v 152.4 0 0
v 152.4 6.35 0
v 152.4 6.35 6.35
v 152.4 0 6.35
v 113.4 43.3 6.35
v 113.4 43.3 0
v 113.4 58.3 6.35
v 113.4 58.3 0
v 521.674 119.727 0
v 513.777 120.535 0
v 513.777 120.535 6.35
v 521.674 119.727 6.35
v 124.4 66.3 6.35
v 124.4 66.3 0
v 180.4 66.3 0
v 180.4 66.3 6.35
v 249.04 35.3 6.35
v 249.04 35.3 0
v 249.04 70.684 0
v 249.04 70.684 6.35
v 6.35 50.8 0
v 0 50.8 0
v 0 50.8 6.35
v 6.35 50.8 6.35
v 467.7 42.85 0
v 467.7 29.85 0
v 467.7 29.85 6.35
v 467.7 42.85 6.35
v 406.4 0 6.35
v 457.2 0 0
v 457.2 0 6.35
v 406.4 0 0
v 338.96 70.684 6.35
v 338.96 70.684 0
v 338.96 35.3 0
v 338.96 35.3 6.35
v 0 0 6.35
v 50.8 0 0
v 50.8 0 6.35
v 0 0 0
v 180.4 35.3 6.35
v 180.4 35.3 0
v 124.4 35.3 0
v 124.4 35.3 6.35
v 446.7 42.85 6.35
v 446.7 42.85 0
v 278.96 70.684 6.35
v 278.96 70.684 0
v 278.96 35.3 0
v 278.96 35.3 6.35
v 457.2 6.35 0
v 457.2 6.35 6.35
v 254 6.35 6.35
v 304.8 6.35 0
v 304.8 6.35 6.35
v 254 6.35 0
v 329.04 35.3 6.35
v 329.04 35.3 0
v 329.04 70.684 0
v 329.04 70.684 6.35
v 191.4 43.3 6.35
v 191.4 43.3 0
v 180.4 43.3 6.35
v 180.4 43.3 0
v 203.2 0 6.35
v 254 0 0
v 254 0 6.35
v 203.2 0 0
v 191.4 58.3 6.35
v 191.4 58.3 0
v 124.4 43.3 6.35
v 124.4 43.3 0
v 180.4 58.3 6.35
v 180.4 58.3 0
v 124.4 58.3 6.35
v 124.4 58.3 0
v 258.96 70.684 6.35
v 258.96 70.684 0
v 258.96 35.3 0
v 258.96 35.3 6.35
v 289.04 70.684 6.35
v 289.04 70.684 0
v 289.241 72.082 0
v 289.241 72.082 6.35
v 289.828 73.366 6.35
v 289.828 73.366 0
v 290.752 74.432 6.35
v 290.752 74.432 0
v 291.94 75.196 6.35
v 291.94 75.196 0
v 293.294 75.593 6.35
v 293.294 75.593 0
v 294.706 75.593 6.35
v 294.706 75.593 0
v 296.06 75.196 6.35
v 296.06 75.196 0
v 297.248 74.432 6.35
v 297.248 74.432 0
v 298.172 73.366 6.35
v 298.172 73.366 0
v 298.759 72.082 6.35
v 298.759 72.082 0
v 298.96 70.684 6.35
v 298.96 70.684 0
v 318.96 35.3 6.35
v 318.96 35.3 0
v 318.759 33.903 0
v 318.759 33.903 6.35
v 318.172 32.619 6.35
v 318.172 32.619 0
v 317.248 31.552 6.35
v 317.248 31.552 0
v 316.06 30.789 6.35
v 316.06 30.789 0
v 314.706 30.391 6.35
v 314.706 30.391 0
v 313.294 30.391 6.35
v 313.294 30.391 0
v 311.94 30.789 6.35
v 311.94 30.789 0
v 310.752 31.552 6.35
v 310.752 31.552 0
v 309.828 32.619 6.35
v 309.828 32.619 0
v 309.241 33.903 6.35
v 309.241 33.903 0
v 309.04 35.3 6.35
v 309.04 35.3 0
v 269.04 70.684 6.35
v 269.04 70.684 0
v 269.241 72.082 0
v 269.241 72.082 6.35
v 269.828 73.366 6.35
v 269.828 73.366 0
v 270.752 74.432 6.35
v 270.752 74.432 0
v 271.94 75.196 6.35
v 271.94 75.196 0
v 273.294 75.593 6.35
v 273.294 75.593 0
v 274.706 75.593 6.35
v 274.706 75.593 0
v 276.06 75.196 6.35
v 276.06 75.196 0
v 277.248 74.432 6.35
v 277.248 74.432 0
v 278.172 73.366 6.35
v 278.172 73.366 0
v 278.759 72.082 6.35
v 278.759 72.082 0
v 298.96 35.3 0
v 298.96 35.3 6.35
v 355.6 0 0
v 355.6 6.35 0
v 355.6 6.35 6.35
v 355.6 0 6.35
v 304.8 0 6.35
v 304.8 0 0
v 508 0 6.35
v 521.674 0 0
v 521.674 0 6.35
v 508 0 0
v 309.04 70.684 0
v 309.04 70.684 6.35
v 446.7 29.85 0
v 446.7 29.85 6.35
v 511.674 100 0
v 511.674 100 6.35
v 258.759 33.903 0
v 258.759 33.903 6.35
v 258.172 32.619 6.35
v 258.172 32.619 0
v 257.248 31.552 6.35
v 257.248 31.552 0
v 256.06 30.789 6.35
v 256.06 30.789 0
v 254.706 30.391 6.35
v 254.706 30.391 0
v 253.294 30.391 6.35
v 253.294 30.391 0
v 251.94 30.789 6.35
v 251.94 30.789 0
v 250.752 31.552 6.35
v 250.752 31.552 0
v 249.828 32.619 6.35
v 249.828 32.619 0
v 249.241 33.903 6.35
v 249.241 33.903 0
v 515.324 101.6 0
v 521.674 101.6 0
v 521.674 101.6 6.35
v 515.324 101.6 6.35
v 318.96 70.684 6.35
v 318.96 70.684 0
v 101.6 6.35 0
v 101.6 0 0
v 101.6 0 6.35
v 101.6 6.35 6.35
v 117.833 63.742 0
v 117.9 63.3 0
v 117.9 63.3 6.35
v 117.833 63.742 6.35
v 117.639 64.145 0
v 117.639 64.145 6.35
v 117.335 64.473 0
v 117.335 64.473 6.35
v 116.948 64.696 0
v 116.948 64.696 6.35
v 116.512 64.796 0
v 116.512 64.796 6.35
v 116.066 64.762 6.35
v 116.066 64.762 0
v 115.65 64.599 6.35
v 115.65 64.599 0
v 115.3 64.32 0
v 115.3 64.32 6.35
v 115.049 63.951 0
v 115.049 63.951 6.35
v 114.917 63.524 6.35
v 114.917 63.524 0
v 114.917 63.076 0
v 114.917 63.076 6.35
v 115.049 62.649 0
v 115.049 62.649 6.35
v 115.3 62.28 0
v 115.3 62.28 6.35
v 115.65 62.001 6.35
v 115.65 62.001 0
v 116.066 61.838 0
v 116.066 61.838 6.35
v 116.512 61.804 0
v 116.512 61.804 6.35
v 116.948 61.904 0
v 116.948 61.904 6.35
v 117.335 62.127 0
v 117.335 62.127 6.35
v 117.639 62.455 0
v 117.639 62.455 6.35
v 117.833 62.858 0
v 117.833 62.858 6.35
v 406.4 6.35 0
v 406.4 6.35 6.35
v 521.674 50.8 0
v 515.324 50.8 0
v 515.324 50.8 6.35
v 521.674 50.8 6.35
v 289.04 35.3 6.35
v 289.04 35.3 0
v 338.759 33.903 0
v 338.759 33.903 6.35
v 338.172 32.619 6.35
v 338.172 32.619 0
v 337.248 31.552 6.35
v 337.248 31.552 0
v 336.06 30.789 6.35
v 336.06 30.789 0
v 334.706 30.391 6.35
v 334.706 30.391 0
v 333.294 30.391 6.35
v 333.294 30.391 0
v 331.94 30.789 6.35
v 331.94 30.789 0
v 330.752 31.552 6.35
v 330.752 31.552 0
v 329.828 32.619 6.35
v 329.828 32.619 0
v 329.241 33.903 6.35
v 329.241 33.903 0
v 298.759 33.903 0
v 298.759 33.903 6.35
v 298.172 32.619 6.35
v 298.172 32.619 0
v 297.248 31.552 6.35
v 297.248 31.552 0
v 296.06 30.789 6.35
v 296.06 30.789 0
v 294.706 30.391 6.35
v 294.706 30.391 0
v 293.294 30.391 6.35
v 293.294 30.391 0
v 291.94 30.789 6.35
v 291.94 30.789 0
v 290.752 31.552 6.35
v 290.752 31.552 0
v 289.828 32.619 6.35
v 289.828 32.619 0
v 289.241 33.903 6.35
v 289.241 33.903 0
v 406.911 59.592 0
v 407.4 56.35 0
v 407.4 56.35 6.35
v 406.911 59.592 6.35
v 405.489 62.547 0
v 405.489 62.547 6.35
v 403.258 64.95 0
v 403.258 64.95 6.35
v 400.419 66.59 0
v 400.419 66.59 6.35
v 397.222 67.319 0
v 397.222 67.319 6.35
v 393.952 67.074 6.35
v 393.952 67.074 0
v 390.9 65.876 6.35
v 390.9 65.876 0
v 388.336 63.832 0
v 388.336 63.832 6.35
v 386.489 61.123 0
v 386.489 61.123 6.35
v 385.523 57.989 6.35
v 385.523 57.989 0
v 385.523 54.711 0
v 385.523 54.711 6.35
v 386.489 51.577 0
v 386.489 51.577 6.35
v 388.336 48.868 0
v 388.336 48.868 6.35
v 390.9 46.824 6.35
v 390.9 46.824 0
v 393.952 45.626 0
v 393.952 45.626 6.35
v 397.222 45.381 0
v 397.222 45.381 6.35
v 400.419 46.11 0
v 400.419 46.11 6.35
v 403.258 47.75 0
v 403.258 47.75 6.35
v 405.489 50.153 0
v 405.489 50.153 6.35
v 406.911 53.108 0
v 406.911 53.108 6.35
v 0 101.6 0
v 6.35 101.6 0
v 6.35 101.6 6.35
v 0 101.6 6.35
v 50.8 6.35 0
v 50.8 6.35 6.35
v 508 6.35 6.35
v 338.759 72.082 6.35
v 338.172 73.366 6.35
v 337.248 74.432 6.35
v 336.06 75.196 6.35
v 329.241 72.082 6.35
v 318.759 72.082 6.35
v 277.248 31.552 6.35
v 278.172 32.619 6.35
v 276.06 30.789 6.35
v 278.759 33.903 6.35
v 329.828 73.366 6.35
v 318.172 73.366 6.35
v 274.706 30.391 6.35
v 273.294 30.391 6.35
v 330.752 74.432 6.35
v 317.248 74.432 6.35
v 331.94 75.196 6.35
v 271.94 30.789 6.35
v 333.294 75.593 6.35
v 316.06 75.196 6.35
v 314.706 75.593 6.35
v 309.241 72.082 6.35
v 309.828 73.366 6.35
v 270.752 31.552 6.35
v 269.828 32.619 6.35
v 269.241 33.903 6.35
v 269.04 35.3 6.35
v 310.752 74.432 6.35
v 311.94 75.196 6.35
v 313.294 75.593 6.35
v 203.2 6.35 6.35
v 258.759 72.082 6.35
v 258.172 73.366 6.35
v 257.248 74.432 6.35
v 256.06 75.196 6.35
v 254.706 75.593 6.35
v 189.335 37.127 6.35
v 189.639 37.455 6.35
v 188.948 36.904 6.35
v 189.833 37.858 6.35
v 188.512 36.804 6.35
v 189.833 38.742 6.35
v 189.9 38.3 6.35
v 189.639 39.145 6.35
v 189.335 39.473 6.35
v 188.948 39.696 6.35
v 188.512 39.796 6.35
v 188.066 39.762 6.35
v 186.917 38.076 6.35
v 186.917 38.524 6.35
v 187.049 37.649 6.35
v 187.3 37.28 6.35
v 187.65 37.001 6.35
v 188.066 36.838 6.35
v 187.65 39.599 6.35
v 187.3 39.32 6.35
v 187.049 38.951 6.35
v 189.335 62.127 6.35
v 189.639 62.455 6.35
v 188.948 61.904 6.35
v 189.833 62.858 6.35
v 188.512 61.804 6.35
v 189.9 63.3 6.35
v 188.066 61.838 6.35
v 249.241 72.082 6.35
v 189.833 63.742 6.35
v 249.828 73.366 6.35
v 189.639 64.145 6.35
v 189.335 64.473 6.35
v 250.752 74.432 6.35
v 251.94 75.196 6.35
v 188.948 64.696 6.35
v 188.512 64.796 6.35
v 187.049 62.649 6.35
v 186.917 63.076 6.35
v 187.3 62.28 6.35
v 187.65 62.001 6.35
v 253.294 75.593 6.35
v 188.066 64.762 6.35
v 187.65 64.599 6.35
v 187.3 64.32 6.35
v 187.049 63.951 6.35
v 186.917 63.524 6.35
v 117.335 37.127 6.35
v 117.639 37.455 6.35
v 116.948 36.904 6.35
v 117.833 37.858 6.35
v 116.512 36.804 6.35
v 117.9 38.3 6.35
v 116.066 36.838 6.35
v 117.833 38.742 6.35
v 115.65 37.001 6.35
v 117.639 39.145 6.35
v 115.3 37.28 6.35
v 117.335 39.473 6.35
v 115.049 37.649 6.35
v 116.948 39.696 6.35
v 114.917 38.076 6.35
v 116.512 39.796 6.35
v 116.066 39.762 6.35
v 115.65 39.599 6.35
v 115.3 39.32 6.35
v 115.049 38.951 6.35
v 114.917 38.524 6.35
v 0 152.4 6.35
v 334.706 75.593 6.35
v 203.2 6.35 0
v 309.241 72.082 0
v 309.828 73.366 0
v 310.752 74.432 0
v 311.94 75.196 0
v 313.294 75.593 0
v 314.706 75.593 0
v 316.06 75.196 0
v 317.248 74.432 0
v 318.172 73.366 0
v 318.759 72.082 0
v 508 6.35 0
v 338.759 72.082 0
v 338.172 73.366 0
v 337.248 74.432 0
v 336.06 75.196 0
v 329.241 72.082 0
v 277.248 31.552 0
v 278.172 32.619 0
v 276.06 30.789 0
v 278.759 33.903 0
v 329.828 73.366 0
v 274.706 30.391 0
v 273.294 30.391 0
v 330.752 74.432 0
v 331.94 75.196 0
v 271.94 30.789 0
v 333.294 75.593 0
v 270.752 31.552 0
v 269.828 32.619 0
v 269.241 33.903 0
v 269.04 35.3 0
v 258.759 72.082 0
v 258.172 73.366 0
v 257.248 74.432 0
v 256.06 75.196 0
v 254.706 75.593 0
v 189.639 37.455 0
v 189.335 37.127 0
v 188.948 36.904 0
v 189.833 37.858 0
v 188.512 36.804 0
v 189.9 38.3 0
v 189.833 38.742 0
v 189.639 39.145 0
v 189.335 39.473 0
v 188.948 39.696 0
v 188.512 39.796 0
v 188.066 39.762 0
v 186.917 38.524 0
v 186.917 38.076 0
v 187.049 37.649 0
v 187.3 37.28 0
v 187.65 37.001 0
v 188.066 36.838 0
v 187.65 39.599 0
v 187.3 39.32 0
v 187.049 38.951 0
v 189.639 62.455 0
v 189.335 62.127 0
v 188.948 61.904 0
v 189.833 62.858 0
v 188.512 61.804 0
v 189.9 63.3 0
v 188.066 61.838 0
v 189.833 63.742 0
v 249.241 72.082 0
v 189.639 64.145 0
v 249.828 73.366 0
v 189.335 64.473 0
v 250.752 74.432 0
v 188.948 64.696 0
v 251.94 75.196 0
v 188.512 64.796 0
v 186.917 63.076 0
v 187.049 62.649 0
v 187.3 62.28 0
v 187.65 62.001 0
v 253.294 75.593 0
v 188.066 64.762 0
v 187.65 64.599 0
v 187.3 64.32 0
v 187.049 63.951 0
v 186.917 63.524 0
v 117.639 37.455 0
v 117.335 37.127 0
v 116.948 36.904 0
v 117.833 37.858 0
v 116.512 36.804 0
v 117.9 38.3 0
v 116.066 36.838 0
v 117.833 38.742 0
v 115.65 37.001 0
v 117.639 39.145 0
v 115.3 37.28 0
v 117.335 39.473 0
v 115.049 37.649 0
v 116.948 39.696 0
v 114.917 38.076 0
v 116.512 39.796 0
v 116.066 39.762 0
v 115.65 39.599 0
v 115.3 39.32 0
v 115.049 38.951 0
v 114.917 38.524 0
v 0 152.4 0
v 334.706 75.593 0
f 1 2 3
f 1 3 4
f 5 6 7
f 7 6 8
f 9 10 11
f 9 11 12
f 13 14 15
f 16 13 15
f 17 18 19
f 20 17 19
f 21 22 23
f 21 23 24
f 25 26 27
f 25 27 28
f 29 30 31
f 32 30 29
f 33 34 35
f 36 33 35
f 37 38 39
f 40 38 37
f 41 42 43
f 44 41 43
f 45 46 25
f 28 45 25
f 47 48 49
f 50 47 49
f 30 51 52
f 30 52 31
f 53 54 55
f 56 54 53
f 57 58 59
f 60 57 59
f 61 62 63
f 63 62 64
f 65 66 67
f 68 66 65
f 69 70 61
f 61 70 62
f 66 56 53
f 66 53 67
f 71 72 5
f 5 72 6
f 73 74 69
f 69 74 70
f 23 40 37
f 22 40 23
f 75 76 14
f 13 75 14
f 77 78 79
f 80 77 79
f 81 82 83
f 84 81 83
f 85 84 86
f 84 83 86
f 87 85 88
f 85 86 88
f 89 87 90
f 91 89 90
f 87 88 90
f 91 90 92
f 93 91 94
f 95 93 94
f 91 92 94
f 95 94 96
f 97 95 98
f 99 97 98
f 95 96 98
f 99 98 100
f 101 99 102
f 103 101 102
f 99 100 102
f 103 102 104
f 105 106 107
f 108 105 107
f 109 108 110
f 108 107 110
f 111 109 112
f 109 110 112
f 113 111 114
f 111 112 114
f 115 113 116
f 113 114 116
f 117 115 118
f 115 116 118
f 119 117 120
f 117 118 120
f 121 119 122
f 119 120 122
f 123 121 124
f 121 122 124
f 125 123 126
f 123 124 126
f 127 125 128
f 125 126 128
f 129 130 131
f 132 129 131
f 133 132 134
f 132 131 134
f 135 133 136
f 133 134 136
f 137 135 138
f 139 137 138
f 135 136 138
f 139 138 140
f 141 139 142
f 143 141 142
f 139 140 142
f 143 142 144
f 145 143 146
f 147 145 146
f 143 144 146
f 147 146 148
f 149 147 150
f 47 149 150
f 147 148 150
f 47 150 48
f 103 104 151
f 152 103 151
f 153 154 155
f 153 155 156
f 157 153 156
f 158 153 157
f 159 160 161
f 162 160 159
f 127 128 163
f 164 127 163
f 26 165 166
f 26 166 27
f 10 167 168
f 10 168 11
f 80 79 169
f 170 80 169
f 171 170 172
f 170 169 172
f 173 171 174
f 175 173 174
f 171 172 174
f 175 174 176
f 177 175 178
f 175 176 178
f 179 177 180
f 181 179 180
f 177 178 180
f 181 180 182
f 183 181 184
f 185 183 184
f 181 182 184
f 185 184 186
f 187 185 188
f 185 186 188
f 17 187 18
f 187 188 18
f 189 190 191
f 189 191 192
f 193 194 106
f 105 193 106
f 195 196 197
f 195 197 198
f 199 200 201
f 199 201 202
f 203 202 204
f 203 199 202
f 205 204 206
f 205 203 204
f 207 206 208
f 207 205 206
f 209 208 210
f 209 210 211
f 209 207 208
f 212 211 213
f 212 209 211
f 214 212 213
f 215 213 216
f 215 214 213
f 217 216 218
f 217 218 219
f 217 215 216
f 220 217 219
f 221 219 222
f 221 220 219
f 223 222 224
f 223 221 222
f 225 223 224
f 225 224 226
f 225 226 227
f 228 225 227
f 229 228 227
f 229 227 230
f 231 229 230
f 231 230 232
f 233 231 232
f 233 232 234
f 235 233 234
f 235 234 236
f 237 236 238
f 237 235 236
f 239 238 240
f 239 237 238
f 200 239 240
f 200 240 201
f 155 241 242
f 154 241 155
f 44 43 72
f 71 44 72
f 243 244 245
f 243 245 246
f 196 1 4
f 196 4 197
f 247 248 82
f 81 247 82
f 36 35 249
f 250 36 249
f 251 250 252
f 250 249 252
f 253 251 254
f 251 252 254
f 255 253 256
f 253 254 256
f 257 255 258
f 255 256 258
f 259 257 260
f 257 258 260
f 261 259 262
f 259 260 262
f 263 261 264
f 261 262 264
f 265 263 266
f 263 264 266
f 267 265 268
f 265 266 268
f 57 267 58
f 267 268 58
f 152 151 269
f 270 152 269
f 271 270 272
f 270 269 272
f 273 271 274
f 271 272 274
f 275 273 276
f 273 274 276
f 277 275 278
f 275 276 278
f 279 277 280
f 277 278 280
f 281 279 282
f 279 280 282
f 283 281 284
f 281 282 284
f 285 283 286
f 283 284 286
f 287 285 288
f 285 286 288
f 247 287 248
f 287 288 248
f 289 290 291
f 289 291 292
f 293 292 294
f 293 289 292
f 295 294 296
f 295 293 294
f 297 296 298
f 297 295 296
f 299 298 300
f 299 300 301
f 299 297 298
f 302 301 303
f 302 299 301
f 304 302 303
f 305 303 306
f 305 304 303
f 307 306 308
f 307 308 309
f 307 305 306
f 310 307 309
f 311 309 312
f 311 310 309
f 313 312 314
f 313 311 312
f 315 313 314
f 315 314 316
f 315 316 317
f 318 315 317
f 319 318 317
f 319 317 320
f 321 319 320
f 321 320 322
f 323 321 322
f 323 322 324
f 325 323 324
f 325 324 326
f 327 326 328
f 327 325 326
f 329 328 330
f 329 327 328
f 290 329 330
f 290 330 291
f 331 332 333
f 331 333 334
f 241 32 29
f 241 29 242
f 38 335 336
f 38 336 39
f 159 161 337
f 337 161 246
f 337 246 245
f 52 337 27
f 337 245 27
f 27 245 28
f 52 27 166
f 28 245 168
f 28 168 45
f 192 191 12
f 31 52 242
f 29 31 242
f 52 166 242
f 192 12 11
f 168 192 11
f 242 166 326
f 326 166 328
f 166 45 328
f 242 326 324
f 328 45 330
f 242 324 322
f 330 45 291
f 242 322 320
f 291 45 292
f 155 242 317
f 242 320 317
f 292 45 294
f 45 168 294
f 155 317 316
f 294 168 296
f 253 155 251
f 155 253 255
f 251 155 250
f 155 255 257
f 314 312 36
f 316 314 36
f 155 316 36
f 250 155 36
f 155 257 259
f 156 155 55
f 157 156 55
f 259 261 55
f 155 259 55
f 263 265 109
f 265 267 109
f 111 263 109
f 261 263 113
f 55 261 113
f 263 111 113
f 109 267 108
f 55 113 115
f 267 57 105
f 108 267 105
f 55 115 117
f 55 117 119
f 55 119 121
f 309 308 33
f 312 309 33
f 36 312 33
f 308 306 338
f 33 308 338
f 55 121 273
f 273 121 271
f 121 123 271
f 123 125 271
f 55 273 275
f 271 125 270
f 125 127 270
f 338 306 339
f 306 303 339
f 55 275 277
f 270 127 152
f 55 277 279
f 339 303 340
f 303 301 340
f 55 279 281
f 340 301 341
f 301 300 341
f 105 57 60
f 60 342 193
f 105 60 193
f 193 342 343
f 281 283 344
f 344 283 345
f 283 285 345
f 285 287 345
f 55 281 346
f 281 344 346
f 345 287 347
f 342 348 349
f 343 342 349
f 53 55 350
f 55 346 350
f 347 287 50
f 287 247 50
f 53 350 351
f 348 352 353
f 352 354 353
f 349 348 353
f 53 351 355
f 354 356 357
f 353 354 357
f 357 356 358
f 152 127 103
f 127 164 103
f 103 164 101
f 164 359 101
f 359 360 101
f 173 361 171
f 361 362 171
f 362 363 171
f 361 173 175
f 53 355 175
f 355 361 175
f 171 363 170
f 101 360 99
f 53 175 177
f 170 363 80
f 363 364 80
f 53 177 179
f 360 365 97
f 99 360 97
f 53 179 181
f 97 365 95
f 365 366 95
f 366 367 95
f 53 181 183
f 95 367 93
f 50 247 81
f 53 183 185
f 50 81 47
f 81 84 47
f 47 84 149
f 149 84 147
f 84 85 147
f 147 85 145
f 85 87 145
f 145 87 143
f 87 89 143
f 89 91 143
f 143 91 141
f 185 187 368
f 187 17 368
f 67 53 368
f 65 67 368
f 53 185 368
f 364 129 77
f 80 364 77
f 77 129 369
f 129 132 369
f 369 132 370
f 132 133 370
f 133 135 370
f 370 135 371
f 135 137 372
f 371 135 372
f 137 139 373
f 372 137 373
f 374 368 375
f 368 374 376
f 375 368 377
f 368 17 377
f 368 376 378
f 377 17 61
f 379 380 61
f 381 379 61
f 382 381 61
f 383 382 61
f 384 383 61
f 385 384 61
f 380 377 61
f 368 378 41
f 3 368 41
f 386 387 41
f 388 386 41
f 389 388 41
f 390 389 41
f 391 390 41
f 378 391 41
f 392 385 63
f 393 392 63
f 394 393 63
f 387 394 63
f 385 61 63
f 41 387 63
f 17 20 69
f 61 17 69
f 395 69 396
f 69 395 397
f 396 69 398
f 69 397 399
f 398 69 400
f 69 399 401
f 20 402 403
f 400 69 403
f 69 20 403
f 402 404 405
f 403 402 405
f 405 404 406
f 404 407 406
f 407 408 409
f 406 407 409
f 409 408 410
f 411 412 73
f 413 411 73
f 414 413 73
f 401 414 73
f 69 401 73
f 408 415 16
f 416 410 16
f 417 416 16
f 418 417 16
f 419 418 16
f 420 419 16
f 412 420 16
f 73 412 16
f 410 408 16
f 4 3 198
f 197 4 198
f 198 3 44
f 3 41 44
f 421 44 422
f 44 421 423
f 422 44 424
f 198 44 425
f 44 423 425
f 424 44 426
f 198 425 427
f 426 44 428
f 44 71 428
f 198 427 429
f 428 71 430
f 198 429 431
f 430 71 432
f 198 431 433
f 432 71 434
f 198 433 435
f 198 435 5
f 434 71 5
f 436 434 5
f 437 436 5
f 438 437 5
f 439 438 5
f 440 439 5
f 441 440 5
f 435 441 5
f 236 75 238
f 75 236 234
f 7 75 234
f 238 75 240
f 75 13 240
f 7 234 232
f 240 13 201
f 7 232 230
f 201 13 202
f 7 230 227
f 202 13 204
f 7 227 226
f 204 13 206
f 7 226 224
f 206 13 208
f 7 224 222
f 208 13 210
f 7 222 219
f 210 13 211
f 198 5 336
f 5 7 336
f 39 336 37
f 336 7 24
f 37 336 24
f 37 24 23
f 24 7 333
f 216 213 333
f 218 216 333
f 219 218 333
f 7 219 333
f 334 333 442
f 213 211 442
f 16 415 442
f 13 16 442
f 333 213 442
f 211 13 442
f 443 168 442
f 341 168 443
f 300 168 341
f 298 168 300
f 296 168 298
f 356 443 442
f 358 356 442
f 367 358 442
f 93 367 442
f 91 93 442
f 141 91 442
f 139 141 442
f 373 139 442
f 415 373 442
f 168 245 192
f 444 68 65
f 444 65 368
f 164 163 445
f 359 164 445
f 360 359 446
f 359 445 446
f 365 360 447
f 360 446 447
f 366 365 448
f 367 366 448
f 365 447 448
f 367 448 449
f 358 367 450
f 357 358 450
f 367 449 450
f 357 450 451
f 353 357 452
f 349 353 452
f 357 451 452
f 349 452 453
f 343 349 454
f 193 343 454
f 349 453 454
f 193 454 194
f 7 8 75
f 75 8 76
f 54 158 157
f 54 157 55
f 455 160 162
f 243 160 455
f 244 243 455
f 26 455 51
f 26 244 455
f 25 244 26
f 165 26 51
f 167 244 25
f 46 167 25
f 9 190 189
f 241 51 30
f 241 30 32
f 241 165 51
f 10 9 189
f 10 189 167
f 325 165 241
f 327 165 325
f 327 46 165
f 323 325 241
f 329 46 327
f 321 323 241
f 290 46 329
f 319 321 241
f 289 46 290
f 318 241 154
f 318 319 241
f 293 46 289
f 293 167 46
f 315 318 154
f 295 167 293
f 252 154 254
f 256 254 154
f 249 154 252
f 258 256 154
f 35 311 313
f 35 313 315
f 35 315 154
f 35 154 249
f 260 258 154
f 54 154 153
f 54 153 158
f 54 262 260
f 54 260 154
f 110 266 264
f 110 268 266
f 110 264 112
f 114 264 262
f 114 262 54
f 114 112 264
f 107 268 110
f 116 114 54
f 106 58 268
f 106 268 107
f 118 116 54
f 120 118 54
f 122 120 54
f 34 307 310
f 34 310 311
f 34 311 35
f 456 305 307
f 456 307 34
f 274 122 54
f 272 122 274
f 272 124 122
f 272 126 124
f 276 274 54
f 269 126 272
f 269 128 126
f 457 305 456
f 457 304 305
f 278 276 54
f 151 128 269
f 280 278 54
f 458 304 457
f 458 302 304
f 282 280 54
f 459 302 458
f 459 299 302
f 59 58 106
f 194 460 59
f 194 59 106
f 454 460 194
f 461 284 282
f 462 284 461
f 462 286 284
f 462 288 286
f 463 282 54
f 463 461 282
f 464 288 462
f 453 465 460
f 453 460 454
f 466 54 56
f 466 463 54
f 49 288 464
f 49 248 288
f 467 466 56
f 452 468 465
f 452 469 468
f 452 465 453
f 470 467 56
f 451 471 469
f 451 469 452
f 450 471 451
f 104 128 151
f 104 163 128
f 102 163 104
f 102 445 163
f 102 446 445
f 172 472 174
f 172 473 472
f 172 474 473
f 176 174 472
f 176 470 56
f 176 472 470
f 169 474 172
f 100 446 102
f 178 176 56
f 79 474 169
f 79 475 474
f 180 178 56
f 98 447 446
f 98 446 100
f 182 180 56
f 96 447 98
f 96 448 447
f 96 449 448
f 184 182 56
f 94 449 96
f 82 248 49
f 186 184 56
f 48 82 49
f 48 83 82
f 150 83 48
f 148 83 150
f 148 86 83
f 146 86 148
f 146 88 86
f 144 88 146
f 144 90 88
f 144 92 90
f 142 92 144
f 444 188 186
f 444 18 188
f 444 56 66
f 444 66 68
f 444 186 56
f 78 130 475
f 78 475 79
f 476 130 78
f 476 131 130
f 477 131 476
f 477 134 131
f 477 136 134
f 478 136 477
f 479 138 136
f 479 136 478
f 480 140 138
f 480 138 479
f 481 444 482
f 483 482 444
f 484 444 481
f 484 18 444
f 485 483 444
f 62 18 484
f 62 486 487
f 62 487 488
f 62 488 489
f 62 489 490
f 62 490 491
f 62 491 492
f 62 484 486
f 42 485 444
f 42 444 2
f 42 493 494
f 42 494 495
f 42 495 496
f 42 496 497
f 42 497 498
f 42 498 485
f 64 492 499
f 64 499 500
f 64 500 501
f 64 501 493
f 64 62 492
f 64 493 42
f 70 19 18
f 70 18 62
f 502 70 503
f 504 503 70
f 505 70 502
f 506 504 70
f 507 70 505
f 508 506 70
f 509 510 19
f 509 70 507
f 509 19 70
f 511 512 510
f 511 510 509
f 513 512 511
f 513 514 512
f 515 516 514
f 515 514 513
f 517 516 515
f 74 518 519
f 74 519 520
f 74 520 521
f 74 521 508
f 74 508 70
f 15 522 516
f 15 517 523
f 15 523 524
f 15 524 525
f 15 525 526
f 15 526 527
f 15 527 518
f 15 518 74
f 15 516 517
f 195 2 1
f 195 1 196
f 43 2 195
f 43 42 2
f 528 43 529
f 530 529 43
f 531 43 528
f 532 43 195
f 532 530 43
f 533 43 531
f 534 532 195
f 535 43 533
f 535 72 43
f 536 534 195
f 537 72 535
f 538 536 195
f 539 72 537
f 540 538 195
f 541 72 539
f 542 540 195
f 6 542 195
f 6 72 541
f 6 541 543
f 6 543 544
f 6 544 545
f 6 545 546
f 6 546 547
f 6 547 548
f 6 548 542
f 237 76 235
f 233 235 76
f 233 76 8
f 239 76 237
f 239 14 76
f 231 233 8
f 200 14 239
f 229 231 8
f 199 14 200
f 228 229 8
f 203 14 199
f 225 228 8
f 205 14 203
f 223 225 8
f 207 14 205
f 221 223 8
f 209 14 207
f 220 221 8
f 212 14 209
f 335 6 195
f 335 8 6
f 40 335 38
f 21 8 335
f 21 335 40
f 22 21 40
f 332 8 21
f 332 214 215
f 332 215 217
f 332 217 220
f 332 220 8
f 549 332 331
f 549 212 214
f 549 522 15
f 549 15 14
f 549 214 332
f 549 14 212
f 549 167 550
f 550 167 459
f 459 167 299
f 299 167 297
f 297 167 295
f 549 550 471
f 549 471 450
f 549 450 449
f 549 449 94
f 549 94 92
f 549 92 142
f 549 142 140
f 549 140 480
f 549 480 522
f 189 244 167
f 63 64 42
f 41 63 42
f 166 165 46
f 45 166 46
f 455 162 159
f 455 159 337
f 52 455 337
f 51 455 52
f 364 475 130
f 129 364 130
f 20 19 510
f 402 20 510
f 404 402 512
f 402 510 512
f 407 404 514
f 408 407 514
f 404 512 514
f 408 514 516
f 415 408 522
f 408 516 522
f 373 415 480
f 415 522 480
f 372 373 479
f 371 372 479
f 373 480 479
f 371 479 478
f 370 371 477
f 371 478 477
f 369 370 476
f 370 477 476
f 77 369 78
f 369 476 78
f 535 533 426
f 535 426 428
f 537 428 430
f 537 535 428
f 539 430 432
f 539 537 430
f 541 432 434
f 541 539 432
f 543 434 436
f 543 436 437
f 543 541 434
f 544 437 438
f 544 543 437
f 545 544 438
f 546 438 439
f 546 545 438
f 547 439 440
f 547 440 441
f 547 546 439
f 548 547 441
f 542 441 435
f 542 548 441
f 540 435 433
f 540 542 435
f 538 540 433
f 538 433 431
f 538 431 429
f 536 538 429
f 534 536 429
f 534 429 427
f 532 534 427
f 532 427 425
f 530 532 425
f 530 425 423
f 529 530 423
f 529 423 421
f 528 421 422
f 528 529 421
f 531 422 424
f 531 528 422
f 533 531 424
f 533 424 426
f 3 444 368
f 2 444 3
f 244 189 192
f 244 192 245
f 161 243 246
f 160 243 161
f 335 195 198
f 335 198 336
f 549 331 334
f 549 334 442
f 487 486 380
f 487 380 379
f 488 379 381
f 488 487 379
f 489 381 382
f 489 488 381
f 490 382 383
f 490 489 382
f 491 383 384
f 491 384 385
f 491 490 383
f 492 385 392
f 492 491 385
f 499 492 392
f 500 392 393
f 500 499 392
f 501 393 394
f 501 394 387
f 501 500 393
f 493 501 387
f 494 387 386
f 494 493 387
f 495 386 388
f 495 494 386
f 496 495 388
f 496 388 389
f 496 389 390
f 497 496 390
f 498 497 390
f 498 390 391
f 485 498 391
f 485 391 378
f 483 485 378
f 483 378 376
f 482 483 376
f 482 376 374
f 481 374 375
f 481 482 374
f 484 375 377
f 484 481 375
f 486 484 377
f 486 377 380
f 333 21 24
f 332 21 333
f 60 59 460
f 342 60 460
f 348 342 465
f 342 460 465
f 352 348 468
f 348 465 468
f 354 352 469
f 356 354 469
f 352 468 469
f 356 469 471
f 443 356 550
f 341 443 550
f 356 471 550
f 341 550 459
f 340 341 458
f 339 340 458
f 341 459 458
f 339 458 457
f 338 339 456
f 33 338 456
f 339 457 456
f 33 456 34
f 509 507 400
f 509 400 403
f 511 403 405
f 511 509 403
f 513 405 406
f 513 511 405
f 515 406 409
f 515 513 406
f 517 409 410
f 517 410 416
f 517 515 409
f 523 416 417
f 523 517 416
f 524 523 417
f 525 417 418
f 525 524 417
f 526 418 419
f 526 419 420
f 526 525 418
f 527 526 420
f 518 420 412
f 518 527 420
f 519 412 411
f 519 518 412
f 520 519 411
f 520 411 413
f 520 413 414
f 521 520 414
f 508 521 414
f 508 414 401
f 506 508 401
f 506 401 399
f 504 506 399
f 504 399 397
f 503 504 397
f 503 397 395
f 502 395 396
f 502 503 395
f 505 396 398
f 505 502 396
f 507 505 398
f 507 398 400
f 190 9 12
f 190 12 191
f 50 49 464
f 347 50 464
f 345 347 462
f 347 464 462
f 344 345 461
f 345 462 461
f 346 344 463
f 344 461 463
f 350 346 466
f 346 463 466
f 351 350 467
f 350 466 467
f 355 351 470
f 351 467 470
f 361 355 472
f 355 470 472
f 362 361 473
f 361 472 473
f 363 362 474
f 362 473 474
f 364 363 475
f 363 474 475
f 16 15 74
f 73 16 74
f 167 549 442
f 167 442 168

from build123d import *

# Parameters (mm, degrees)
SKETCH2_R           = 11
SKETCH2_R_2         = 1.5
SKETCH2_W           = 21
SKETCH2_H           = 13
BOSS_EXTRUDE1_DEPTH = 6.35


with BuildPart() as part:
    # Sketch2 → Boss-Extrude1 (new body)
    with BuildSketch(Plane.XY):
        Polygon((0, 152.4), (511.673882957, 100), (513.77689344, 120.535411062), (521.673882957, 119.726688428), (521.673882957, 101.6), (515.323882957, 101.6), (515.323882957, 50.8), (521.673882957, 50.8), (521.673882957, 0), (508, 0), (508, 6.35), (457.2, 6.35), (457.2, 0), (406.4, 0), (406.4, 6.35), (355.6, 6.35), (355.6, 0), (304.8, 0), (304.8, 6.35), (254, 6.35), (254, 0), (203.2, 0), (203.2, 6.35), (152.4, 6.35), (152.4, 0), (101.6, 0), (101.6, 6.35), (50.8, 6.35), (50.8, 0), (0, 0), (0, 50.8), (6.35, 50.8), (6.35, 101.6), (0, 101.6), align=None)
        with Locations((396.4, 56.35)):
            Circle(SKETCH2_R, mode=Mode.SUBTRACT)
        with Locations((116.4, 63.3)):
            Circle(SKETCH2_R_2, mode=Mode.SUBTRACT)
        with Locations((188.4, 63.3)):
            Circle(SKETCH2_R_2, mode=Mode.SUBTRACT)
        with Locations((188.4, 38.3)):
            Circle(SKETCH2_R_2, mode=Mode.SUBTRACT)
        with Locations((116.4, 38.3)):
            Circle(SKETCH2_R_2, mode=Mode.SUBTRACT)
        Polygon((180.4, 58.3), (191.4, 58.3), (191.4, 43.3), (180.4, 43.3), (180.4, 35.3), (124.4, 35.3), (124.4, 43.3), (113.4, 43.3), (113.4, 58.3), (124.4, 58.3), (124.4, 66.3), (180.4, 66.3), align=None, mode=Mode.SUBTRACT)
        with Locations((457.2, 36.35)):
            Rectangle(SKETCH2_W, SKETCH2_H, mode=Mode.SUBTRACT)
        with BuildLine():
            Line((249.0403247, 35.3), (249.0403247, 70.684208401))
            ThreePointArc((249.0403247, 70.684208401), (254, 75.643883701), (258.9596753, 70.684208401))
            Line((258.9596753, 70.684208401), (258.9596753, 35.3))
            ThreePointArc((258.9596753, 35.3), (254, 30.3403247), (249.0403247, 35.3))
        make_face(mode=Mode.SUBTRACT)
        with BuildLine():
            Line((269.0403247, 35.3), (269.0403247, 70.684208401))
            ThreePointArc((269.0403247, 70.684208401), (274, 75.643883701), (278.9596753, 70.684208401))
            Line((278.9596753, 70.684208401), (278.9596753, 35.3))
            ThreePointArc((278.9596753, 35.3), (274, 30.3403247), (269.0403247, 35.3))
        make_face(mode=Mode.SUBTRACT)
        with BuildLine():
            Line((289.0403247, 35.3), (289.0403247, 70.684208401))
            ThreePointArc((289.0403247, 70.684208401), (294, 75.643883701), (298.9596753, 70.684208401))
            Line((298.9596753, 70.684208401), (298.9596753, 35.3))
            ThreePointArc((298.9596753, 35.3), (294, 30.3403247), (289.0403247, 35.3))
        make_face(mode=Mode.SUBTRACT)
        with BuildLine():
            Line((309.0403247, 35.3), (309.0403247, 70.684208401))
            ThreePointArc((309.0403247, 70.684208401), (314, 75.643883701), (318.9596753, 70.684208401))
            Line((318.9596753, 70.684208401), (318.9596753, 35.3))
            ThreePointArc((318.9596753, 35.3), (314, 30.3403247), (309.0403247, 35.3))
        make_face(mode=Mode.SUBTRACT)
        with BuildLine():
            Line((329.0403247, 35.3), (329.0403247, 70.684208401))
            ThreePointArc((329.0403247, 70.684208401), (334, 75.643883701), (338.9596753, 70.684208401))
            Line((338.9596753, 70.684208401), (338.9596753, 35.3))
            ThreePointArc((338.9596753, 35.3), (334, 30.3403247), (329.0403247, 35.3))
        make_face(mode=Mode.SUBTRACT)
    extrude(amount=BOSS_EXTRUDE1_DEPTH)


solid = part.part
